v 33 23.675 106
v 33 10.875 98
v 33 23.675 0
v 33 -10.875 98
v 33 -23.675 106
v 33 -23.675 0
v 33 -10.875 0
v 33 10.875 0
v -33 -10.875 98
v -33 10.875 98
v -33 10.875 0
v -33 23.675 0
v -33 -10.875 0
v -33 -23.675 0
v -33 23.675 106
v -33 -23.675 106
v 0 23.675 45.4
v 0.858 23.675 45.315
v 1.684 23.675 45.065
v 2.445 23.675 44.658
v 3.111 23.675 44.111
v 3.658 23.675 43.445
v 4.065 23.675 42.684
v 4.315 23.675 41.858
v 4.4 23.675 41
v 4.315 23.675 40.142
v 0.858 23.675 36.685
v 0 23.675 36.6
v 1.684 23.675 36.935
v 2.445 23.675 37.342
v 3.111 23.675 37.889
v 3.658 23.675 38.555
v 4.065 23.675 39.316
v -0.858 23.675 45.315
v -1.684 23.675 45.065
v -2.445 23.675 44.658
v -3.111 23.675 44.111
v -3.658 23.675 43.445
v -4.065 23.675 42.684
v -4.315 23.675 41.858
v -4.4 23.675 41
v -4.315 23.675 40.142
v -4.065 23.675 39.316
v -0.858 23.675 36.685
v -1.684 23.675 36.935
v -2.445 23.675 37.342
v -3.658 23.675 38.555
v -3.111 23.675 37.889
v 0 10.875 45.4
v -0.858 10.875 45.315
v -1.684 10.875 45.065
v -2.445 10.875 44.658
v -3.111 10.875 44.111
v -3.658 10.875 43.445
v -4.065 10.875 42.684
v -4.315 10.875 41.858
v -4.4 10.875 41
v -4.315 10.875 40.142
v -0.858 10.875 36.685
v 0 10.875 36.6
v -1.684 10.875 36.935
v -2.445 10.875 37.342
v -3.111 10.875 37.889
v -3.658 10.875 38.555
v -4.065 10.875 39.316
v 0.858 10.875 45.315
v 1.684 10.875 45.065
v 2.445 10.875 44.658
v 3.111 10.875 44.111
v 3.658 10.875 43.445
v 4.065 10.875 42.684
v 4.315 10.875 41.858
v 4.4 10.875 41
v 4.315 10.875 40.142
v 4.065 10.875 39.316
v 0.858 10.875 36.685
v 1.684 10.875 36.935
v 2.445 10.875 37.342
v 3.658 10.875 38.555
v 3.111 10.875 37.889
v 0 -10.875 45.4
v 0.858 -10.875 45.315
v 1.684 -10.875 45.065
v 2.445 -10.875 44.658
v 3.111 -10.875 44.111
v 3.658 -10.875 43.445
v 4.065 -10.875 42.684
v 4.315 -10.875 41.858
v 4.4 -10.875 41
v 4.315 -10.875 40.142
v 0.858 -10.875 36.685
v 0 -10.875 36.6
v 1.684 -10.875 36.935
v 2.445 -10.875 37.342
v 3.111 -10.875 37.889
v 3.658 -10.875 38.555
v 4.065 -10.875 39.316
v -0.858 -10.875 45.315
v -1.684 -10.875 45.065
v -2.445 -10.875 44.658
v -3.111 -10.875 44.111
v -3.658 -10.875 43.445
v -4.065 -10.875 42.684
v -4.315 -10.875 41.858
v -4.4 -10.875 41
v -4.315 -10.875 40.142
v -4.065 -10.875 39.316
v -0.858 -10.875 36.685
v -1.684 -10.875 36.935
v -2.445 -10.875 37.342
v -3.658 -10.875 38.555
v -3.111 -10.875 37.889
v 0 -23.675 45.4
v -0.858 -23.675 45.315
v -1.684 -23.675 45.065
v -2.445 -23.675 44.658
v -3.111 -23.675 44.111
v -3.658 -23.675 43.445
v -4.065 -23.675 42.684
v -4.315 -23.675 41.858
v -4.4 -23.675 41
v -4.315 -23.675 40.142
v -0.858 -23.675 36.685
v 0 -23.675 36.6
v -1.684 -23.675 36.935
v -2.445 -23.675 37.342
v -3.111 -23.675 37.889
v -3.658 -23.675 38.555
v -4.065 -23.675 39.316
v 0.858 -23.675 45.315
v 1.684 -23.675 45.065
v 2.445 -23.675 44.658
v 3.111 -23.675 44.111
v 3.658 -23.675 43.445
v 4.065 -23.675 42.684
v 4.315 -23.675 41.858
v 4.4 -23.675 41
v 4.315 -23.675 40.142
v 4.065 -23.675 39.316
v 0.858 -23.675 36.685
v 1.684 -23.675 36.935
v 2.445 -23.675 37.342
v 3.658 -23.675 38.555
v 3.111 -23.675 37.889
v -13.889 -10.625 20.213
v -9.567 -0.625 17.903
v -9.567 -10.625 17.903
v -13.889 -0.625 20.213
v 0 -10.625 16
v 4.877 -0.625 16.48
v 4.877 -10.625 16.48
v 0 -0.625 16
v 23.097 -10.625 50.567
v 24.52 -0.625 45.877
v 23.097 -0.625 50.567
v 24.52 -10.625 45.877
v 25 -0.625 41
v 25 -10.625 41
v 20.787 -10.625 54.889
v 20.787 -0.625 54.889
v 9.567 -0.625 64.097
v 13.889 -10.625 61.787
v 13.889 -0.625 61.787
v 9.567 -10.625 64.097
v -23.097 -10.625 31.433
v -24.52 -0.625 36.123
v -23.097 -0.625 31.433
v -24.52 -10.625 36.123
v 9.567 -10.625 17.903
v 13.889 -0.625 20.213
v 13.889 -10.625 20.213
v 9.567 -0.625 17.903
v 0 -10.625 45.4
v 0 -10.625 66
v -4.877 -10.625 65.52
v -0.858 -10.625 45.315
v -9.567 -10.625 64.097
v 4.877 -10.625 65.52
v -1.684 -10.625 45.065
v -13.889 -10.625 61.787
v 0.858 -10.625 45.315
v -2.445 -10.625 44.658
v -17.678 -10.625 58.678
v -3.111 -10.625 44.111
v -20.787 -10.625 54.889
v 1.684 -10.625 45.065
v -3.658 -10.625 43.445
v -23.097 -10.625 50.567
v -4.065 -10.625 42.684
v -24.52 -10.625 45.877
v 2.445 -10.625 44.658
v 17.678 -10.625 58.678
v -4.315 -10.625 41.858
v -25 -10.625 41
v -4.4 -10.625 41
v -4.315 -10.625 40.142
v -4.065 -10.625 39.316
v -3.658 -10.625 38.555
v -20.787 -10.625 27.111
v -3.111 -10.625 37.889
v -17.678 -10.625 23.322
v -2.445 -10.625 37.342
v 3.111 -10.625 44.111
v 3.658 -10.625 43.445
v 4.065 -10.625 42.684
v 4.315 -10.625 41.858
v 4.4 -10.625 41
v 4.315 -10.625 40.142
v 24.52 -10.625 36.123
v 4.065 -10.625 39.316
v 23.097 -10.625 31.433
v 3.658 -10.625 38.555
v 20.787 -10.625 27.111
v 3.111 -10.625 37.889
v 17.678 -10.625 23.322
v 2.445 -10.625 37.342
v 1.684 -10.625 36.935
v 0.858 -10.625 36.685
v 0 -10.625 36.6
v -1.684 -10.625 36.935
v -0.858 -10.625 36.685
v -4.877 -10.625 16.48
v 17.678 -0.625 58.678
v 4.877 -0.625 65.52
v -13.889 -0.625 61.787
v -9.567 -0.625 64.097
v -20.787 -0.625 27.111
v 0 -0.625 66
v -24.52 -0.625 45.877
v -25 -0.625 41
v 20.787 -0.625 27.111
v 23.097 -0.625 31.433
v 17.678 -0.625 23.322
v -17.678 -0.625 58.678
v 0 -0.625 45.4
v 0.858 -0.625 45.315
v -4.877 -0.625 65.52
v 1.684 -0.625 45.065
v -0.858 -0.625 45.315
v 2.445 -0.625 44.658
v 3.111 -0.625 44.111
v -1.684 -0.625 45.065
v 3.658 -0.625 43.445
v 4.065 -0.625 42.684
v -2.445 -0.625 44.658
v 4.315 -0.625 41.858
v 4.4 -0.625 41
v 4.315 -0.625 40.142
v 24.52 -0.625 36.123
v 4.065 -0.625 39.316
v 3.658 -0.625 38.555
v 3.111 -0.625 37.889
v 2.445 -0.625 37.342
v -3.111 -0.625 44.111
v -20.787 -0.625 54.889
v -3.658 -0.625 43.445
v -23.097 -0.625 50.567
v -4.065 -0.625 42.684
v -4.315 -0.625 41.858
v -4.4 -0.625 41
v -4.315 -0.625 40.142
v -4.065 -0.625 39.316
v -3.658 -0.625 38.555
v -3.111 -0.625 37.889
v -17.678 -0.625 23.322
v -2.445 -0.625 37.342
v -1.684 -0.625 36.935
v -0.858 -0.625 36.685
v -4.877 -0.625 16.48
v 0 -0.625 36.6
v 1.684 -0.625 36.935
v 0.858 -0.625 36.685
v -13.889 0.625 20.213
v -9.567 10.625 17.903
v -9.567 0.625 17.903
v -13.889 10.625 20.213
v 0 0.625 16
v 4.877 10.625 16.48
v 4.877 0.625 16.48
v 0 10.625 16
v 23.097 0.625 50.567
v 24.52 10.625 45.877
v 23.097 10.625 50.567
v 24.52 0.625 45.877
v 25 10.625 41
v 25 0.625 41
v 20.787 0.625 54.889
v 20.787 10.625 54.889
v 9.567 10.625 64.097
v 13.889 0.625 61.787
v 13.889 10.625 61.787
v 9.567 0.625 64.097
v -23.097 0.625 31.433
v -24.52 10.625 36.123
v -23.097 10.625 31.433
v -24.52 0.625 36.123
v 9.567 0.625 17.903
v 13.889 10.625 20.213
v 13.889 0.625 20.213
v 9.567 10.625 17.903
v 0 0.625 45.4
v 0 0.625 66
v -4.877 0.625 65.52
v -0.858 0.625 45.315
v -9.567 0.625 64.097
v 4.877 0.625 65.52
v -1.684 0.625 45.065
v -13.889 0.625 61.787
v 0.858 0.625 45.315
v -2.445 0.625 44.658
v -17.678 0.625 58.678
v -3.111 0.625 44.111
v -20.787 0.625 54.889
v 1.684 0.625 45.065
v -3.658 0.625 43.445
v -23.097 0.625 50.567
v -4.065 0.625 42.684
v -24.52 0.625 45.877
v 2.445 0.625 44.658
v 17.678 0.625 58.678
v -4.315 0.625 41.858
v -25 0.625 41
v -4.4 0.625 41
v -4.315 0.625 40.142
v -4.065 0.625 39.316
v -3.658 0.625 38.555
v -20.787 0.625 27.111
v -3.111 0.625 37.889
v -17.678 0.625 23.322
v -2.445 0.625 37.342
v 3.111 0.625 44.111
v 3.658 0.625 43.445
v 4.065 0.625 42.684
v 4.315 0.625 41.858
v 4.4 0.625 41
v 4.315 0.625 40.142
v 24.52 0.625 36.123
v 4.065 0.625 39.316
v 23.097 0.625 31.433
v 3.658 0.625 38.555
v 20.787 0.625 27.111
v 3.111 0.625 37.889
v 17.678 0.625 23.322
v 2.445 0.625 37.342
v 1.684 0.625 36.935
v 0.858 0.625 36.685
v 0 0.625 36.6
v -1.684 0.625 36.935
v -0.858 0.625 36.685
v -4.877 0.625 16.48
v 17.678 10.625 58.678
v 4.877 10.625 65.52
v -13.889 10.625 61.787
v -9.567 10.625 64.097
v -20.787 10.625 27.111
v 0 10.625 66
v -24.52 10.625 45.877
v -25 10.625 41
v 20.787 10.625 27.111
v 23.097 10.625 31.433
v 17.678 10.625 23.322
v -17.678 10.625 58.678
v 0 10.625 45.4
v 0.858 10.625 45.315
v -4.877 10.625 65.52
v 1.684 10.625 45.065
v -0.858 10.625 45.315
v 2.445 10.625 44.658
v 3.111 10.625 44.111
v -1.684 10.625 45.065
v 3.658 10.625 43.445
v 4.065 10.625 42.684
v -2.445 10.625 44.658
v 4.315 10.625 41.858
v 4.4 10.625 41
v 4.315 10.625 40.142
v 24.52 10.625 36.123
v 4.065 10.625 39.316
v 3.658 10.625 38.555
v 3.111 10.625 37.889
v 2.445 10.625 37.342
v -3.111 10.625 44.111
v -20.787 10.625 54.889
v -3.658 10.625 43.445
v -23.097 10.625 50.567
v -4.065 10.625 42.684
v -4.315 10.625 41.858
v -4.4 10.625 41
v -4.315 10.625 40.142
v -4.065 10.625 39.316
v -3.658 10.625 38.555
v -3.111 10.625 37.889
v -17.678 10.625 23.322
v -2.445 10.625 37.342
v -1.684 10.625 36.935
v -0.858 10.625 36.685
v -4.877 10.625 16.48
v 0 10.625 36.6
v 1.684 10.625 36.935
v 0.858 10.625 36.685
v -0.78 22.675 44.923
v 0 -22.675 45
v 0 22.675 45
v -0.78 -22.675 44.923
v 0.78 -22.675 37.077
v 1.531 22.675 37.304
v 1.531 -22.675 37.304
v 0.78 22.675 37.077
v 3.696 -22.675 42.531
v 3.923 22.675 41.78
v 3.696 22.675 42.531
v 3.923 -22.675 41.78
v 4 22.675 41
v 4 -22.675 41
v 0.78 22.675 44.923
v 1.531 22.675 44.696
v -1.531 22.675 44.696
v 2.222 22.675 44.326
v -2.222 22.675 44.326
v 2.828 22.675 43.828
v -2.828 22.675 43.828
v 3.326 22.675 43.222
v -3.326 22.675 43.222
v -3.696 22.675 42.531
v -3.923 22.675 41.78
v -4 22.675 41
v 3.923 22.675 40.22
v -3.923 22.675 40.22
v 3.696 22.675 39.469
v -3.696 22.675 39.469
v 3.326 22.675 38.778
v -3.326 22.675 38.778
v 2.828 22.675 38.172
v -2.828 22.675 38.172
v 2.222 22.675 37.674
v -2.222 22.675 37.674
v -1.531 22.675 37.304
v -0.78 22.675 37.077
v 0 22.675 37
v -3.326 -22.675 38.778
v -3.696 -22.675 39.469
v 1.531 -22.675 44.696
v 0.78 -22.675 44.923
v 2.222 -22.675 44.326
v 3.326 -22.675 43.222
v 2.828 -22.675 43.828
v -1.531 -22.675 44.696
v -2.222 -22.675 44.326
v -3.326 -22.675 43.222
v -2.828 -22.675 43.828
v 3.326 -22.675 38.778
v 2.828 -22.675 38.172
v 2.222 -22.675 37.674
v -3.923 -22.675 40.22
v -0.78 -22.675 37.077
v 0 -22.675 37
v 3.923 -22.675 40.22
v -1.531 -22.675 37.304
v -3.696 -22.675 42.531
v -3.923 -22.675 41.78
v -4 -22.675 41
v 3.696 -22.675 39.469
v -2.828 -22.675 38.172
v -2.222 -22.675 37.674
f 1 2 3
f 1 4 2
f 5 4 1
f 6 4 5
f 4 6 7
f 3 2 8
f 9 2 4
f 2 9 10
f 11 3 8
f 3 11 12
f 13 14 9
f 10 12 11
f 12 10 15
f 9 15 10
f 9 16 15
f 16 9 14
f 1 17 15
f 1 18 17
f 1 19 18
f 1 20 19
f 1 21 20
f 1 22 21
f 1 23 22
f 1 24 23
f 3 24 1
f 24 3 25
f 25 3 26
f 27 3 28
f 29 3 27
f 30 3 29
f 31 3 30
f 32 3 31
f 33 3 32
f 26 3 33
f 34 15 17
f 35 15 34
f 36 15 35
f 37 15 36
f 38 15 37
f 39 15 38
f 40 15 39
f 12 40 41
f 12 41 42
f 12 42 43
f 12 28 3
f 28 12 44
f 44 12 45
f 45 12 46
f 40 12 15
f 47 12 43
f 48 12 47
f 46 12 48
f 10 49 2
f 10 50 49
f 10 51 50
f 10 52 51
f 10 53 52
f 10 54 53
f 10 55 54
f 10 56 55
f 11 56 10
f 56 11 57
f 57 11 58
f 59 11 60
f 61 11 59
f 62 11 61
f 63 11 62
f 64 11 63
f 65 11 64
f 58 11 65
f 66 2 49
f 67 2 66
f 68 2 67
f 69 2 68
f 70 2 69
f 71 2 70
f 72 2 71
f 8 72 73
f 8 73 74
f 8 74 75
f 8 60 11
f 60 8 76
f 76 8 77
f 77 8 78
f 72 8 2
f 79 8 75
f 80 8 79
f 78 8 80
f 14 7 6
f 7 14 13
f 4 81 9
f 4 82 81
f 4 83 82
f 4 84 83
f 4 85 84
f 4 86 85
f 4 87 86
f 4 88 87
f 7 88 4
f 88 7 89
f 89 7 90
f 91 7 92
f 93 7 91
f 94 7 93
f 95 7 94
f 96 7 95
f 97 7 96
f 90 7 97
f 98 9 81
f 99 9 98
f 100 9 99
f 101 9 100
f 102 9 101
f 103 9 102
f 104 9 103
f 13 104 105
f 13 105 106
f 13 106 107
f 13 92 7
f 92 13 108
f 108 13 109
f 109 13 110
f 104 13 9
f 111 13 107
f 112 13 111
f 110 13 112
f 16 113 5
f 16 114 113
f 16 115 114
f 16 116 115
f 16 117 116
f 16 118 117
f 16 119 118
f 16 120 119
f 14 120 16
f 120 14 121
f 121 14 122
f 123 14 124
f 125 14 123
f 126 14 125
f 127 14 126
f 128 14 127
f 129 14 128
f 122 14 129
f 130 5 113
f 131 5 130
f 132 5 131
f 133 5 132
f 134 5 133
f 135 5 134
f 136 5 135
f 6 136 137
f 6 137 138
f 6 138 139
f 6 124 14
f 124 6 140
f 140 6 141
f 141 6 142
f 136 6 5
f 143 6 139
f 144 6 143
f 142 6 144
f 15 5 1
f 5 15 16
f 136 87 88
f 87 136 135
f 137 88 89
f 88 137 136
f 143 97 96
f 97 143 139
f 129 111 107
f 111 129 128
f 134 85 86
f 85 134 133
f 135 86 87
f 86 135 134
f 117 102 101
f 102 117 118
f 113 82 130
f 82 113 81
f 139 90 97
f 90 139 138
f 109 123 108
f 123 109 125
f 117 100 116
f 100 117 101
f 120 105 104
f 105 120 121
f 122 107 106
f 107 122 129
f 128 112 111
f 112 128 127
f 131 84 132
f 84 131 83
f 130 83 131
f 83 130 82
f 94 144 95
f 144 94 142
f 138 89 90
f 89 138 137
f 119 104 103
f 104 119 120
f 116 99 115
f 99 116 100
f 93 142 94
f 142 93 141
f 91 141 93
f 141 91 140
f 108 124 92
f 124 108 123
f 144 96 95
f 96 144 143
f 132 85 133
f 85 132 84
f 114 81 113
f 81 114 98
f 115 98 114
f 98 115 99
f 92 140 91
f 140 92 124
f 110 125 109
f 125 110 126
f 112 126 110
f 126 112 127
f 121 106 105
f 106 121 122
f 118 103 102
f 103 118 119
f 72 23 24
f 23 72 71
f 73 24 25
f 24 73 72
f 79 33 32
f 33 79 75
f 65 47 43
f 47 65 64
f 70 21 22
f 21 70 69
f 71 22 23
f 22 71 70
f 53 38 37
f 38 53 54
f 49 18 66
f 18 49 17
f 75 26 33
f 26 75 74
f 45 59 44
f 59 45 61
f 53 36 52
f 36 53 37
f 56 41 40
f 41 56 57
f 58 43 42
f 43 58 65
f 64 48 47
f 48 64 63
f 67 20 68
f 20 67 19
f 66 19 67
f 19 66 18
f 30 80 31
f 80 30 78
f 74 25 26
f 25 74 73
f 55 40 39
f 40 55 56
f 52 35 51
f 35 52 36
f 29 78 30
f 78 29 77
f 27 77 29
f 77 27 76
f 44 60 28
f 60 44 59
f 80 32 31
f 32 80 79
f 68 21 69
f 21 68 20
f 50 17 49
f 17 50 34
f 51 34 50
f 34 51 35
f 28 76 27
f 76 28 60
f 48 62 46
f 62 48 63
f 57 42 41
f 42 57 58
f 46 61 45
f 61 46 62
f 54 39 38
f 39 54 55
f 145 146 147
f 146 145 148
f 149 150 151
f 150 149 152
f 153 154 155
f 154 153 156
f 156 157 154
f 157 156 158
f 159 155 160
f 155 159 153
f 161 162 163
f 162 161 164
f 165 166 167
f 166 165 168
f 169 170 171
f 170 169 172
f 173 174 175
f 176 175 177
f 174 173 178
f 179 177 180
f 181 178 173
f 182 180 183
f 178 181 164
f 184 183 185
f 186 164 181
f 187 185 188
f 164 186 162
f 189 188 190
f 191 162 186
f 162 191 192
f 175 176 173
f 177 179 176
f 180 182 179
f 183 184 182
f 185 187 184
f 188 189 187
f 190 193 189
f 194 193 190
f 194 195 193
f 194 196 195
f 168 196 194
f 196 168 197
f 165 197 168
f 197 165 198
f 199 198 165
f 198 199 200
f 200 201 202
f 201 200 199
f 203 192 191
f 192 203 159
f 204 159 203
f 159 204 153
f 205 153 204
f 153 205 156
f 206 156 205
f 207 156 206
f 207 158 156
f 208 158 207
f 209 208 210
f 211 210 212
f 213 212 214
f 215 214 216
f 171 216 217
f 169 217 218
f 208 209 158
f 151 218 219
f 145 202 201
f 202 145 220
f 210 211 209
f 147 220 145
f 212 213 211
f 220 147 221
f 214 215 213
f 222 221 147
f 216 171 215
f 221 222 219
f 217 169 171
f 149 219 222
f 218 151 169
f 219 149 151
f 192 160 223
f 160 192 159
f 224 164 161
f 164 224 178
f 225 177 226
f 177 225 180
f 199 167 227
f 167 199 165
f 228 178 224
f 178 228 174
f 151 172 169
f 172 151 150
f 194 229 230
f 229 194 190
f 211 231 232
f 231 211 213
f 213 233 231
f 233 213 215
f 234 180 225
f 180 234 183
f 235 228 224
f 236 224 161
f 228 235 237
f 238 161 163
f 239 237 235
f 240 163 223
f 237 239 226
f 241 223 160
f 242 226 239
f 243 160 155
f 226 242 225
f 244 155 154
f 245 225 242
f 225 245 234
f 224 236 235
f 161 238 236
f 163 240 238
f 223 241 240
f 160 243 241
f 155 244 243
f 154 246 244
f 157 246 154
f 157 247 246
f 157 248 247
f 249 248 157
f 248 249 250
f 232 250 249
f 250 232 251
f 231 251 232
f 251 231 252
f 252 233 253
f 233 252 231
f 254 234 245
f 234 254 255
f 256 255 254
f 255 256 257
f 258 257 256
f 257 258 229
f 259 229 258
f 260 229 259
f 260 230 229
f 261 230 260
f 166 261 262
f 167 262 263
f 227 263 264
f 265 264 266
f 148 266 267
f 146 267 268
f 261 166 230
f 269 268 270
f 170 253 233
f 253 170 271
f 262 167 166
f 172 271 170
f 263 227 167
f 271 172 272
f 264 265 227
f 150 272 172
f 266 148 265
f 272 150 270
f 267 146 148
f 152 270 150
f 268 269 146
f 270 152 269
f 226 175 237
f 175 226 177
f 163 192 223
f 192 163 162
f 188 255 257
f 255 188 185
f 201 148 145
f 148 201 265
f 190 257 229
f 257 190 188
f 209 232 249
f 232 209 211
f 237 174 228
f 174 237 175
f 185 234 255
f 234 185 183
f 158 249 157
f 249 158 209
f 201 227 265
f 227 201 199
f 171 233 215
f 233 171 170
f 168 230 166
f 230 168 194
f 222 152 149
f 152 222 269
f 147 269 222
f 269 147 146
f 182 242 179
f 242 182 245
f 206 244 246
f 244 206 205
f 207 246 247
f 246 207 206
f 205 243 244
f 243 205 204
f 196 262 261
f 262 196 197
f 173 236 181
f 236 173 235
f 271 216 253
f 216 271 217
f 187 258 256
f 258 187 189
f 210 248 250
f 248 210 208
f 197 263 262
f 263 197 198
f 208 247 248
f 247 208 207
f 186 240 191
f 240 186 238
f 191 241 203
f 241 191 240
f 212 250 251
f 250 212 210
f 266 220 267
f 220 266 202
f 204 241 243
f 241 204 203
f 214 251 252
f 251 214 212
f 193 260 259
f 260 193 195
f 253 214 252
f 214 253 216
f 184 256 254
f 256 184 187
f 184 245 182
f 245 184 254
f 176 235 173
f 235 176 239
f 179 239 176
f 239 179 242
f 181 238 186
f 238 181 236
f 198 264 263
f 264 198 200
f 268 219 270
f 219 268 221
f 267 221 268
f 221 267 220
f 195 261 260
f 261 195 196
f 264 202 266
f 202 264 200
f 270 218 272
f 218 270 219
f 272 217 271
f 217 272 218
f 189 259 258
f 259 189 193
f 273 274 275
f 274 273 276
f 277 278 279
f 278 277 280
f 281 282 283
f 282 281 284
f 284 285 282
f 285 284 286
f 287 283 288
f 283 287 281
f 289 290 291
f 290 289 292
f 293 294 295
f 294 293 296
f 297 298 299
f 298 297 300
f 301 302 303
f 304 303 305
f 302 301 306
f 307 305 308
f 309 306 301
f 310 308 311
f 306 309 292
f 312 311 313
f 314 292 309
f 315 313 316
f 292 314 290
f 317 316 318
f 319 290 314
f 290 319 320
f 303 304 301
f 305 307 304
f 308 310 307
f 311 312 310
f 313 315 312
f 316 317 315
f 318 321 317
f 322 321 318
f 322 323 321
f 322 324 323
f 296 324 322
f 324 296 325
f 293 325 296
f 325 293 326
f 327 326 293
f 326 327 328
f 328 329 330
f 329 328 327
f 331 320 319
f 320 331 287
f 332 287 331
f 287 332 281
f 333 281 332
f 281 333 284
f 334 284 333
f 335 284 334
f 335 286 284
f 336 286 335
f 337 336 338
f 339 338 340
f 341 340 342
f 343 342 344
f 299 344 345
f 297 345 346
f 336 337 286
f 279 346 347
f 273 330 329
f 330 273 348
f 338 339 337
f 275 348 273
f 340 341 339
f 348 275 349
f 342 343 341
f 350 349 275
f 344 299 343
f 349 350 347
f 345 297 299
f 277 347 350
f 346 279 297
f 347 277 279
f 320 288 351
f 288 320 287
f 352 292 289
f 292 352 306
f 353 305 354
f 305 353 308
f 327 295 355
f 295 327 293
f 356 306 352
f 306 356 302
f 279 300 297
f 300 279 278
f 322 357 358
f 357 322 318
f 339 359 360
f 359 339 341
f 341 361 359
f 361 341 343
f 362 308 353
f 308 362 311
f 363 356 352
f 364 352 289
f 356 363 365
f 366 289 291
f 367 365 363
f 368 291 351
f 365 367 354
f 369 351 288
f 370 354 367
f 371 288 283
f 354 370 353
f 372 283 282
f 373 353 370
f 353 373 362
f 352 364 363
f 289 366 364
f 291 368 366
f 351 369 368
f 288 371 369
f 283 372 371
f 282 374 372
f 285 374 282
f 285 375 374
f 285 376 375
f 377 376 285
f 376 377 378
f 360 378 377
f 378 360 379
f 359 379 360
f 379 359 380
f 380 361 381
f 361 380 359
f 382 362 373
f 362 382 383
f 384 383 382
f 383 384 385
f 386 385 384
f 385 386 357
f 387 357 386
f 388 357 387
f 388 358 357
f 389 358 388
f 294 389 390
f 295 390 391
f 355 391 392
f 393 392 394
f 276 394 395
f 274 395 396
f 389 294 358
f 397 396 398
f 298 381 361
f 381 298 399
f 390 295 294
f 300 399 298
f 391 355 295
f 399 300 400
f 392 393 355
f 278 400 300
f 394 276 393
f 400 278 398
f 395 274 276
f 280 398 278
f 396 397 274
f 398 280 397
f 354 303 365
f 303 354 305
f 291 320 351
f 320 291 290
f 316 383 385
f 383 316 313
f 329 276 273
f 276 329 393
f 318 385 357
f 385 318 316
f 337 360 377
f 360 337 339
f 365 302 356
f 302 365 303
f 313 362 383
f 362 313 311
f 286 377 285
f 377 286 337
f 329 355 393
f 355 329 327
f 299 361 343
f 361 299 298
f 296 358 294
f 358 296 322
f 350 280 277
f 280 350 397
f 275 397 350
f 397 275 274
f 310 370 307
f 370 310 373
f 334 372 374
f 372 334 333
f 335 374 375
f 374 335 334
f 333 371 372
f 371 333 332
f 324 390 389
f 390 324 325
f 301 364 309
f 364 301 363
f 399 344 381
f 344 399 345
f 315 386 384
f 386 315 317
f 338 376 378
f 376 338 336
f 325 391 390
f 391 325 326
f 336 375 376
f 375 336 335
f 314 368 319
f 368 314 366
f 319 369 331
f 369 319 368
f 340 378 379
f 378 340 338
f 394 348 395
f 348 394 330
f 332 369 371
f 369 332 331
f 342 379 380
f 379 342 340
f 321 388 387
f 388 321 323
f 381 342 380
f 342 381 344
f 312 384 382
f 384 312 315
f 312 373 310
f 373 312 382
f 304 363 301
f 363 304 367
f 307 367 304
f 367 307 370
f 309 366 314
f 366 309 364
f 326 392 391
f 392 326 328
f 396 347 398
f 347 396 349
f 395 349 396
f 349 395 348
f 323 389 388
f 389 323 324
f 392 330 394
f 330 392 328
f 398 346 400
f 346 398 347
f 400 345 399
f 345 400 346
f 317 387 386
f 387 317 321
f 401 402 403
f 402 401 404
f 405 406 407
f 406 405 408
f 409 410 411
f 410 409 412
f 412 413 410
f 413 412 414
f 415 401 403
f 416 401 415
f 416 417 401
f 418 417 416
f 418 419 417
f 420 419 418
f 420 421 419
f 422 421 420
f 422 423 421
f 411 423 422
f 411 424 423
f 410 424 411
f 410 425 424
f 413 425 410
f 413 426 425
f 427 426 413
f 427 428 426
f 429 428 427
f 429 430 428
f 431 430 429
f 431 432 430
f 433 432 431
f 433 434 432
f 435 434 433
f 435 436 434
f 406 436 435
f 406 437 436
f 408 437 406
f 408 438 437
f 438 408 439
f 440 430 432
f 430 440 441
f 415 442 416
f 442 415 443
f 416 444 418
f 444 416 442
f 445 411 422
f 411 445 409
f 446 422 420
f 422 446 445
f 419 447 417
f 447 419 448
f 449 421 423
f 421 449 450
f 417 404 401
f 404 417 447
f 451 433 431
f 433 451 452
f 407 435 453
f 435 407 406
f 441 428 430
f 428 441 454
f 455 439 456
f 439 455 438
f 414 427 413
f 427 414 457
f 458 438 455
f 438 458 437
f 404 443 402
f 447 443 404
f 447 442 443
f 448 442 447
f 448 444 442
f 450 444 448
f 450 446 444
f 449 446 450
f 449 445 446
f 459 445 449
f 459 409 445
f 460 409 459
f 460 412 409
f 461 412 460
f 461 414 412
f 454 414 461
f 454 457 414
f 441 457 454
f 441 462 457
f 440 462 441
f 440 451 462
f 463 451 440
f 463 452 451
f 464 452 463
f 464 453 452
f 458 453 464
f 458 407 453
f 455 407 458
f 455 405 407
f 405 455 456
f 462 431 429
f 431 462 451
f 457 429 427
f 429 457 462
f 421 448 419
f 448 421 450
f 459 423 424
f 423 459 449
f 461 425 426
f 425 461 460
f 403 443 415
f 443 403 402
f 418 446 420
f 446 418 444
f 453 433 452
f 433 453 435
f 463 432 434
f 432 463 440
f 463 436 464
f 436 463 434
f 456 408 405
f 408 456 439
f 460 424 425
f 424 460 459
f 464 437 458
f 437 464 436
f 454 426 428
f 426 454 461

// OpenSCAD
$fn = 32;

// ------------------------------------------------------------------------
// Trolley wheel set: wheels d50, fork 98 mm tall
// Every part is its own module, assembly() places every instance.
// ------------------------------------------------------------------------

// --- part 1 ---
module trolley_fork() {
  difference() {
    union() {
      translate([-33, 10.875, 0]) cube([66, 12.8, 98]);
      translate([-33, -23.675, 0]) cube([66, 12.8, 98]);
      translate([-33, -23.675, 98]) cube([66, 47.35, 8]);
    }
    translate([0, -17.275, 41]) rotate([90, 0, 0]) cylinder(h = 14.8, d = 8.8, center = true);
    translate([0, 17.275, 41]) rotate([90, 0, 0]) cylinder(h = 14.8, d = 8.8, center = true);
  }
}

// --- part 2 ---
module trolley_wheel() {
  difference() {
      translate([0, 0, 0]) cylinder(h = 10, d = 50);
      translate([0, 0, -1]) cylinder(h = 12, d = 8.8);
    }
}

// --- part 3 ---
module trolley_axle() {
  translate([0, 0, -22.675]) cylinder(h = 45.35, d = 8);
}

// --- assembly ---
module assembly() {
  color([0.80, 0.24, 0.20]) translate([0, 0, 0]) rotate([0, 0, 0]) trolley_fork();
  color([0.20, 0.45, 0.75]) translate([0, -0.625, 41]) rotate([90, 0, 0]) trolley_wheel();
  color([0.25, 0.62, 0.32]) translate([0, 10.625, 41]) rotate([90, 0, 0]) trolley_wheel();
  color([0.92, 0.70, 0.18]) translate([0, 0, 41]) rotate([90, 0, 0]) trolley_axle();
}

assembly();
